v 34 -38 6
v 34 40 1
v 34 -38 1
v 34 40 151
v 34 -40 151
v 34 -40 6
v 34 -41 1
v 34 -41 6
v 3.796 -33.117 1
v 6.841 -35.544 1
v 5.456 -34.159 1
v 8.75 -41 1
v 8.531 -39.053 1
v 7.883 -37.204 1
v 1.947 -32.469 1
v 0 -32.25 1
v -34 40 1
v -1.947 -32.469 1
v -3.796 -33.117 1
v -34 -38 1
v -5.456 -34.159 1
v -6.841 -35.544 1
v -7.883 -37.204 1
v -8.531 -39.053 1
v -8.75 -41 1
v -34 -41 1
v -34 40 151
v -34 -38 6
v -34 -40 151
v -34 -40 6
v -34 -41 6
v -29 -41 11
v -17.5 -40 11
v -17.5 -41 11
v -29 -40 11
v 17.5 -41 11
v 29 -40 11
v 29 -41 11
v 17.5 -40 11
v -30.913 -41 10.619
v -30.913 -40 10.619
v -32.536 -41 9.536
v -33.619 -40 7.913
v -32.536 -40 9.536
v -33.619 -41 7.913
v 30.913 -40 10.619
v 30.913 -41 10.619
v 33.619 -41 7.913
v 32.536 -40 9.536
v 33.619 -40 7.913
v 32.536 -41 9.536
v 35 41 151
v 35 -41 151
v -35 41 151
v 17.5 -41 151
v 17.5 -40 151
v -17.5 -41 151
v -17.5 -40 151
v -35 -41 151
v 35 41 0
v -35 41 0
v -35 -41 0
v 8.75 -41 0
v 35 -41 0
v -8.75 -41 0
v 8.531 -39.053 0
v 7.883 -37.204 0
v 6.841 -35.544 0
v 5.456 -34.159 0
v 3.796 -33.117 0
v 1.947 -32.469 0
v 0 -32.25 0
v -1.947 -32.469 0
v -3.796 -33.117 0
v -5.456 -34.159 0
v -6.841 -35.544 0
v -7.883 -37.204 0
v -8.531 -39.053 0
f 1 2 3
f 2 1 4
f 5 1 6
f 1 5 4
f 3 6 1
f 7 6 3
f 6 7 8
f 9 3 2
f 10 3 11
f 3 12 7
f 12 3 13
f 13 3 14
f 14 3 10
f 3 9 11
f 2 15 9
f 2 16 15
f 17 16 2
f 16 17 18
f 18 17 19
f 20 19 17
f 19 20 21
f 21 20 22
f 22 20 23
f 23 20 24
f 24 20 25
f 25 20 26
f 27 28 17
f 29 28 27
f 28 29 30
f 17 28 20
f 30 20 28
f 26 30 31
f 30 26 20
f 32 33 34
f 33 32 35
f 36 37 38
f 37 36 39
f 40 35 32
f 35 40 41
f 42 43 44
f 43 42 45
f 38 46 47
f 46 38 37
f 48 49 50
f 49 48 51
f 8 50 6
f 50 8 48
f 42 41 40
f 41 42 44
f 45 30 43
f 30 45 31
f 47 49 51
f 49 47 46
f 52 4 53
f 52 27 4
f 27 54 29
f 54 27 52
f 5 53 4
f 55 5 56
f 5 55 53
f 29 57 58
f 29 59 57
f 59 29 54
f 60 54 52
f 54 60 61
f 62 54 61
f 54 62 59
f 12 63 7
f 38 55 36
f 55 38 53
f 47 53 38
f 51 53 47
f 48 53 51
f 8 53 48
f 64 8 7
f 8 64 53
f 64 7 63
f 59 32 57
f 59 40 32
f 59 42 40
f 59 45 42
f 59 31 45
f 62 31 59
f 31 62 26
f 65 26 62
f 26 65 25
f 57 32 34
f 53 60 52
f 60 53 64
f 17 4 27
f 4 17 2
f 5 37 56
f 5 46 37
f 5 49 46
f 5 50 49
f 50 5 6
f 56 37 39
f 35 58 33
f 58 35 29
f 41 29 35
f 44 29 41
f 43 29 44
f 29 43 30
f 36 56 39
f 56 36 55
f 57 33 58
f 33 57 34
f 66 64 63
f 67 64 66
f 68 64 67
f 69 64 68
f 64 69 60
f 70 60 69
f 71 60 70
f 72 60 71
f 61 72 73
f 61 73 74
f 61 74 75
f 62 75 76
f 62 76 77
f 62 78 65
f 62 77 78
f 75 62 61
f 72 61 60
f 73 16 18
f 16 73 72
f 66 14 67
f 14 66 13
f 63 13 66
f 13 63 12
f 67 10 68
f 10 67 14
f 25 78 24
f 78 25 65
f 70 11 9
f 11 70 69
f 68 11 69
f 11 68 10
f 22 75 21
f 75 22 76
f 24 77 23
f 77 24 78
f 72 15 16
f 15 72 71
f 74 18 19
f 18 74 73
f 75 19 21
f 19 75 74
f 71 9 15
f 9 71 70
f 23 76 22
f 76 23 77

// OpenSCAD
dispenser_x = 70;
dispenser_y = 82;
dispsnser_z = 150;
wall_thickness = 1;
enterance_thickness = 5;

cutout_overlap_size = 4;

teabag_dispenser(dispenser_x, dispenser_y, dispsnser_z, wall_thickness, enterance_thickness, cutout_overlap_size);

module teabag_dispenser(x, y, z, thick, enter_thick, cutout) {
    module frame(thickness) {
        difference() {
            children();
            offset(r = -thickness) children();
        }
    }

    translate([0, 0, thick]) union() {
        // walls
        difference() {
            linear_extrude(z, 0)
                frame(thick)
                square([x, y], center = true);

            // front part
            translate([-x / 4, -y / 2 - cutout / 2, -cutout / 2])
                cube([x / 2, thick + cutout, z + cutout]);
            
            // pull out part
            translate([-x / 2 + thick, -y / 2 - cutout / 2, 0]) scale([1, (thick + cutout) / thick, 1]) union() {
                x = x - thick * 2;

                cube([x, thick, enter_thick]);

                // rounded top
                round_top = enter_thick;
                translate([0, thick, round_top]) rotate([90, 0, 0]) hull() {
                    translate([0 + round_top, 0, 0])
                        cylinder(r = round_top, h = thick, center = false);
                    translate([x - round_top, 0, 0])
                        cylinder(r = round_top, h = thick, center = false);
                }
            }
        }

        // floor
        translate([-x / 2, -y / 2, -thick]) difference() {
            // floor
            cube([x, y, thick]);

            // puch out
            punch_radius = min(x, y) / 8;
            translate([x / 2, 0, -cutout / 2])
                cylinder(r = punch_radius, h = thick + cutout, center = false);
        }
    }
}
